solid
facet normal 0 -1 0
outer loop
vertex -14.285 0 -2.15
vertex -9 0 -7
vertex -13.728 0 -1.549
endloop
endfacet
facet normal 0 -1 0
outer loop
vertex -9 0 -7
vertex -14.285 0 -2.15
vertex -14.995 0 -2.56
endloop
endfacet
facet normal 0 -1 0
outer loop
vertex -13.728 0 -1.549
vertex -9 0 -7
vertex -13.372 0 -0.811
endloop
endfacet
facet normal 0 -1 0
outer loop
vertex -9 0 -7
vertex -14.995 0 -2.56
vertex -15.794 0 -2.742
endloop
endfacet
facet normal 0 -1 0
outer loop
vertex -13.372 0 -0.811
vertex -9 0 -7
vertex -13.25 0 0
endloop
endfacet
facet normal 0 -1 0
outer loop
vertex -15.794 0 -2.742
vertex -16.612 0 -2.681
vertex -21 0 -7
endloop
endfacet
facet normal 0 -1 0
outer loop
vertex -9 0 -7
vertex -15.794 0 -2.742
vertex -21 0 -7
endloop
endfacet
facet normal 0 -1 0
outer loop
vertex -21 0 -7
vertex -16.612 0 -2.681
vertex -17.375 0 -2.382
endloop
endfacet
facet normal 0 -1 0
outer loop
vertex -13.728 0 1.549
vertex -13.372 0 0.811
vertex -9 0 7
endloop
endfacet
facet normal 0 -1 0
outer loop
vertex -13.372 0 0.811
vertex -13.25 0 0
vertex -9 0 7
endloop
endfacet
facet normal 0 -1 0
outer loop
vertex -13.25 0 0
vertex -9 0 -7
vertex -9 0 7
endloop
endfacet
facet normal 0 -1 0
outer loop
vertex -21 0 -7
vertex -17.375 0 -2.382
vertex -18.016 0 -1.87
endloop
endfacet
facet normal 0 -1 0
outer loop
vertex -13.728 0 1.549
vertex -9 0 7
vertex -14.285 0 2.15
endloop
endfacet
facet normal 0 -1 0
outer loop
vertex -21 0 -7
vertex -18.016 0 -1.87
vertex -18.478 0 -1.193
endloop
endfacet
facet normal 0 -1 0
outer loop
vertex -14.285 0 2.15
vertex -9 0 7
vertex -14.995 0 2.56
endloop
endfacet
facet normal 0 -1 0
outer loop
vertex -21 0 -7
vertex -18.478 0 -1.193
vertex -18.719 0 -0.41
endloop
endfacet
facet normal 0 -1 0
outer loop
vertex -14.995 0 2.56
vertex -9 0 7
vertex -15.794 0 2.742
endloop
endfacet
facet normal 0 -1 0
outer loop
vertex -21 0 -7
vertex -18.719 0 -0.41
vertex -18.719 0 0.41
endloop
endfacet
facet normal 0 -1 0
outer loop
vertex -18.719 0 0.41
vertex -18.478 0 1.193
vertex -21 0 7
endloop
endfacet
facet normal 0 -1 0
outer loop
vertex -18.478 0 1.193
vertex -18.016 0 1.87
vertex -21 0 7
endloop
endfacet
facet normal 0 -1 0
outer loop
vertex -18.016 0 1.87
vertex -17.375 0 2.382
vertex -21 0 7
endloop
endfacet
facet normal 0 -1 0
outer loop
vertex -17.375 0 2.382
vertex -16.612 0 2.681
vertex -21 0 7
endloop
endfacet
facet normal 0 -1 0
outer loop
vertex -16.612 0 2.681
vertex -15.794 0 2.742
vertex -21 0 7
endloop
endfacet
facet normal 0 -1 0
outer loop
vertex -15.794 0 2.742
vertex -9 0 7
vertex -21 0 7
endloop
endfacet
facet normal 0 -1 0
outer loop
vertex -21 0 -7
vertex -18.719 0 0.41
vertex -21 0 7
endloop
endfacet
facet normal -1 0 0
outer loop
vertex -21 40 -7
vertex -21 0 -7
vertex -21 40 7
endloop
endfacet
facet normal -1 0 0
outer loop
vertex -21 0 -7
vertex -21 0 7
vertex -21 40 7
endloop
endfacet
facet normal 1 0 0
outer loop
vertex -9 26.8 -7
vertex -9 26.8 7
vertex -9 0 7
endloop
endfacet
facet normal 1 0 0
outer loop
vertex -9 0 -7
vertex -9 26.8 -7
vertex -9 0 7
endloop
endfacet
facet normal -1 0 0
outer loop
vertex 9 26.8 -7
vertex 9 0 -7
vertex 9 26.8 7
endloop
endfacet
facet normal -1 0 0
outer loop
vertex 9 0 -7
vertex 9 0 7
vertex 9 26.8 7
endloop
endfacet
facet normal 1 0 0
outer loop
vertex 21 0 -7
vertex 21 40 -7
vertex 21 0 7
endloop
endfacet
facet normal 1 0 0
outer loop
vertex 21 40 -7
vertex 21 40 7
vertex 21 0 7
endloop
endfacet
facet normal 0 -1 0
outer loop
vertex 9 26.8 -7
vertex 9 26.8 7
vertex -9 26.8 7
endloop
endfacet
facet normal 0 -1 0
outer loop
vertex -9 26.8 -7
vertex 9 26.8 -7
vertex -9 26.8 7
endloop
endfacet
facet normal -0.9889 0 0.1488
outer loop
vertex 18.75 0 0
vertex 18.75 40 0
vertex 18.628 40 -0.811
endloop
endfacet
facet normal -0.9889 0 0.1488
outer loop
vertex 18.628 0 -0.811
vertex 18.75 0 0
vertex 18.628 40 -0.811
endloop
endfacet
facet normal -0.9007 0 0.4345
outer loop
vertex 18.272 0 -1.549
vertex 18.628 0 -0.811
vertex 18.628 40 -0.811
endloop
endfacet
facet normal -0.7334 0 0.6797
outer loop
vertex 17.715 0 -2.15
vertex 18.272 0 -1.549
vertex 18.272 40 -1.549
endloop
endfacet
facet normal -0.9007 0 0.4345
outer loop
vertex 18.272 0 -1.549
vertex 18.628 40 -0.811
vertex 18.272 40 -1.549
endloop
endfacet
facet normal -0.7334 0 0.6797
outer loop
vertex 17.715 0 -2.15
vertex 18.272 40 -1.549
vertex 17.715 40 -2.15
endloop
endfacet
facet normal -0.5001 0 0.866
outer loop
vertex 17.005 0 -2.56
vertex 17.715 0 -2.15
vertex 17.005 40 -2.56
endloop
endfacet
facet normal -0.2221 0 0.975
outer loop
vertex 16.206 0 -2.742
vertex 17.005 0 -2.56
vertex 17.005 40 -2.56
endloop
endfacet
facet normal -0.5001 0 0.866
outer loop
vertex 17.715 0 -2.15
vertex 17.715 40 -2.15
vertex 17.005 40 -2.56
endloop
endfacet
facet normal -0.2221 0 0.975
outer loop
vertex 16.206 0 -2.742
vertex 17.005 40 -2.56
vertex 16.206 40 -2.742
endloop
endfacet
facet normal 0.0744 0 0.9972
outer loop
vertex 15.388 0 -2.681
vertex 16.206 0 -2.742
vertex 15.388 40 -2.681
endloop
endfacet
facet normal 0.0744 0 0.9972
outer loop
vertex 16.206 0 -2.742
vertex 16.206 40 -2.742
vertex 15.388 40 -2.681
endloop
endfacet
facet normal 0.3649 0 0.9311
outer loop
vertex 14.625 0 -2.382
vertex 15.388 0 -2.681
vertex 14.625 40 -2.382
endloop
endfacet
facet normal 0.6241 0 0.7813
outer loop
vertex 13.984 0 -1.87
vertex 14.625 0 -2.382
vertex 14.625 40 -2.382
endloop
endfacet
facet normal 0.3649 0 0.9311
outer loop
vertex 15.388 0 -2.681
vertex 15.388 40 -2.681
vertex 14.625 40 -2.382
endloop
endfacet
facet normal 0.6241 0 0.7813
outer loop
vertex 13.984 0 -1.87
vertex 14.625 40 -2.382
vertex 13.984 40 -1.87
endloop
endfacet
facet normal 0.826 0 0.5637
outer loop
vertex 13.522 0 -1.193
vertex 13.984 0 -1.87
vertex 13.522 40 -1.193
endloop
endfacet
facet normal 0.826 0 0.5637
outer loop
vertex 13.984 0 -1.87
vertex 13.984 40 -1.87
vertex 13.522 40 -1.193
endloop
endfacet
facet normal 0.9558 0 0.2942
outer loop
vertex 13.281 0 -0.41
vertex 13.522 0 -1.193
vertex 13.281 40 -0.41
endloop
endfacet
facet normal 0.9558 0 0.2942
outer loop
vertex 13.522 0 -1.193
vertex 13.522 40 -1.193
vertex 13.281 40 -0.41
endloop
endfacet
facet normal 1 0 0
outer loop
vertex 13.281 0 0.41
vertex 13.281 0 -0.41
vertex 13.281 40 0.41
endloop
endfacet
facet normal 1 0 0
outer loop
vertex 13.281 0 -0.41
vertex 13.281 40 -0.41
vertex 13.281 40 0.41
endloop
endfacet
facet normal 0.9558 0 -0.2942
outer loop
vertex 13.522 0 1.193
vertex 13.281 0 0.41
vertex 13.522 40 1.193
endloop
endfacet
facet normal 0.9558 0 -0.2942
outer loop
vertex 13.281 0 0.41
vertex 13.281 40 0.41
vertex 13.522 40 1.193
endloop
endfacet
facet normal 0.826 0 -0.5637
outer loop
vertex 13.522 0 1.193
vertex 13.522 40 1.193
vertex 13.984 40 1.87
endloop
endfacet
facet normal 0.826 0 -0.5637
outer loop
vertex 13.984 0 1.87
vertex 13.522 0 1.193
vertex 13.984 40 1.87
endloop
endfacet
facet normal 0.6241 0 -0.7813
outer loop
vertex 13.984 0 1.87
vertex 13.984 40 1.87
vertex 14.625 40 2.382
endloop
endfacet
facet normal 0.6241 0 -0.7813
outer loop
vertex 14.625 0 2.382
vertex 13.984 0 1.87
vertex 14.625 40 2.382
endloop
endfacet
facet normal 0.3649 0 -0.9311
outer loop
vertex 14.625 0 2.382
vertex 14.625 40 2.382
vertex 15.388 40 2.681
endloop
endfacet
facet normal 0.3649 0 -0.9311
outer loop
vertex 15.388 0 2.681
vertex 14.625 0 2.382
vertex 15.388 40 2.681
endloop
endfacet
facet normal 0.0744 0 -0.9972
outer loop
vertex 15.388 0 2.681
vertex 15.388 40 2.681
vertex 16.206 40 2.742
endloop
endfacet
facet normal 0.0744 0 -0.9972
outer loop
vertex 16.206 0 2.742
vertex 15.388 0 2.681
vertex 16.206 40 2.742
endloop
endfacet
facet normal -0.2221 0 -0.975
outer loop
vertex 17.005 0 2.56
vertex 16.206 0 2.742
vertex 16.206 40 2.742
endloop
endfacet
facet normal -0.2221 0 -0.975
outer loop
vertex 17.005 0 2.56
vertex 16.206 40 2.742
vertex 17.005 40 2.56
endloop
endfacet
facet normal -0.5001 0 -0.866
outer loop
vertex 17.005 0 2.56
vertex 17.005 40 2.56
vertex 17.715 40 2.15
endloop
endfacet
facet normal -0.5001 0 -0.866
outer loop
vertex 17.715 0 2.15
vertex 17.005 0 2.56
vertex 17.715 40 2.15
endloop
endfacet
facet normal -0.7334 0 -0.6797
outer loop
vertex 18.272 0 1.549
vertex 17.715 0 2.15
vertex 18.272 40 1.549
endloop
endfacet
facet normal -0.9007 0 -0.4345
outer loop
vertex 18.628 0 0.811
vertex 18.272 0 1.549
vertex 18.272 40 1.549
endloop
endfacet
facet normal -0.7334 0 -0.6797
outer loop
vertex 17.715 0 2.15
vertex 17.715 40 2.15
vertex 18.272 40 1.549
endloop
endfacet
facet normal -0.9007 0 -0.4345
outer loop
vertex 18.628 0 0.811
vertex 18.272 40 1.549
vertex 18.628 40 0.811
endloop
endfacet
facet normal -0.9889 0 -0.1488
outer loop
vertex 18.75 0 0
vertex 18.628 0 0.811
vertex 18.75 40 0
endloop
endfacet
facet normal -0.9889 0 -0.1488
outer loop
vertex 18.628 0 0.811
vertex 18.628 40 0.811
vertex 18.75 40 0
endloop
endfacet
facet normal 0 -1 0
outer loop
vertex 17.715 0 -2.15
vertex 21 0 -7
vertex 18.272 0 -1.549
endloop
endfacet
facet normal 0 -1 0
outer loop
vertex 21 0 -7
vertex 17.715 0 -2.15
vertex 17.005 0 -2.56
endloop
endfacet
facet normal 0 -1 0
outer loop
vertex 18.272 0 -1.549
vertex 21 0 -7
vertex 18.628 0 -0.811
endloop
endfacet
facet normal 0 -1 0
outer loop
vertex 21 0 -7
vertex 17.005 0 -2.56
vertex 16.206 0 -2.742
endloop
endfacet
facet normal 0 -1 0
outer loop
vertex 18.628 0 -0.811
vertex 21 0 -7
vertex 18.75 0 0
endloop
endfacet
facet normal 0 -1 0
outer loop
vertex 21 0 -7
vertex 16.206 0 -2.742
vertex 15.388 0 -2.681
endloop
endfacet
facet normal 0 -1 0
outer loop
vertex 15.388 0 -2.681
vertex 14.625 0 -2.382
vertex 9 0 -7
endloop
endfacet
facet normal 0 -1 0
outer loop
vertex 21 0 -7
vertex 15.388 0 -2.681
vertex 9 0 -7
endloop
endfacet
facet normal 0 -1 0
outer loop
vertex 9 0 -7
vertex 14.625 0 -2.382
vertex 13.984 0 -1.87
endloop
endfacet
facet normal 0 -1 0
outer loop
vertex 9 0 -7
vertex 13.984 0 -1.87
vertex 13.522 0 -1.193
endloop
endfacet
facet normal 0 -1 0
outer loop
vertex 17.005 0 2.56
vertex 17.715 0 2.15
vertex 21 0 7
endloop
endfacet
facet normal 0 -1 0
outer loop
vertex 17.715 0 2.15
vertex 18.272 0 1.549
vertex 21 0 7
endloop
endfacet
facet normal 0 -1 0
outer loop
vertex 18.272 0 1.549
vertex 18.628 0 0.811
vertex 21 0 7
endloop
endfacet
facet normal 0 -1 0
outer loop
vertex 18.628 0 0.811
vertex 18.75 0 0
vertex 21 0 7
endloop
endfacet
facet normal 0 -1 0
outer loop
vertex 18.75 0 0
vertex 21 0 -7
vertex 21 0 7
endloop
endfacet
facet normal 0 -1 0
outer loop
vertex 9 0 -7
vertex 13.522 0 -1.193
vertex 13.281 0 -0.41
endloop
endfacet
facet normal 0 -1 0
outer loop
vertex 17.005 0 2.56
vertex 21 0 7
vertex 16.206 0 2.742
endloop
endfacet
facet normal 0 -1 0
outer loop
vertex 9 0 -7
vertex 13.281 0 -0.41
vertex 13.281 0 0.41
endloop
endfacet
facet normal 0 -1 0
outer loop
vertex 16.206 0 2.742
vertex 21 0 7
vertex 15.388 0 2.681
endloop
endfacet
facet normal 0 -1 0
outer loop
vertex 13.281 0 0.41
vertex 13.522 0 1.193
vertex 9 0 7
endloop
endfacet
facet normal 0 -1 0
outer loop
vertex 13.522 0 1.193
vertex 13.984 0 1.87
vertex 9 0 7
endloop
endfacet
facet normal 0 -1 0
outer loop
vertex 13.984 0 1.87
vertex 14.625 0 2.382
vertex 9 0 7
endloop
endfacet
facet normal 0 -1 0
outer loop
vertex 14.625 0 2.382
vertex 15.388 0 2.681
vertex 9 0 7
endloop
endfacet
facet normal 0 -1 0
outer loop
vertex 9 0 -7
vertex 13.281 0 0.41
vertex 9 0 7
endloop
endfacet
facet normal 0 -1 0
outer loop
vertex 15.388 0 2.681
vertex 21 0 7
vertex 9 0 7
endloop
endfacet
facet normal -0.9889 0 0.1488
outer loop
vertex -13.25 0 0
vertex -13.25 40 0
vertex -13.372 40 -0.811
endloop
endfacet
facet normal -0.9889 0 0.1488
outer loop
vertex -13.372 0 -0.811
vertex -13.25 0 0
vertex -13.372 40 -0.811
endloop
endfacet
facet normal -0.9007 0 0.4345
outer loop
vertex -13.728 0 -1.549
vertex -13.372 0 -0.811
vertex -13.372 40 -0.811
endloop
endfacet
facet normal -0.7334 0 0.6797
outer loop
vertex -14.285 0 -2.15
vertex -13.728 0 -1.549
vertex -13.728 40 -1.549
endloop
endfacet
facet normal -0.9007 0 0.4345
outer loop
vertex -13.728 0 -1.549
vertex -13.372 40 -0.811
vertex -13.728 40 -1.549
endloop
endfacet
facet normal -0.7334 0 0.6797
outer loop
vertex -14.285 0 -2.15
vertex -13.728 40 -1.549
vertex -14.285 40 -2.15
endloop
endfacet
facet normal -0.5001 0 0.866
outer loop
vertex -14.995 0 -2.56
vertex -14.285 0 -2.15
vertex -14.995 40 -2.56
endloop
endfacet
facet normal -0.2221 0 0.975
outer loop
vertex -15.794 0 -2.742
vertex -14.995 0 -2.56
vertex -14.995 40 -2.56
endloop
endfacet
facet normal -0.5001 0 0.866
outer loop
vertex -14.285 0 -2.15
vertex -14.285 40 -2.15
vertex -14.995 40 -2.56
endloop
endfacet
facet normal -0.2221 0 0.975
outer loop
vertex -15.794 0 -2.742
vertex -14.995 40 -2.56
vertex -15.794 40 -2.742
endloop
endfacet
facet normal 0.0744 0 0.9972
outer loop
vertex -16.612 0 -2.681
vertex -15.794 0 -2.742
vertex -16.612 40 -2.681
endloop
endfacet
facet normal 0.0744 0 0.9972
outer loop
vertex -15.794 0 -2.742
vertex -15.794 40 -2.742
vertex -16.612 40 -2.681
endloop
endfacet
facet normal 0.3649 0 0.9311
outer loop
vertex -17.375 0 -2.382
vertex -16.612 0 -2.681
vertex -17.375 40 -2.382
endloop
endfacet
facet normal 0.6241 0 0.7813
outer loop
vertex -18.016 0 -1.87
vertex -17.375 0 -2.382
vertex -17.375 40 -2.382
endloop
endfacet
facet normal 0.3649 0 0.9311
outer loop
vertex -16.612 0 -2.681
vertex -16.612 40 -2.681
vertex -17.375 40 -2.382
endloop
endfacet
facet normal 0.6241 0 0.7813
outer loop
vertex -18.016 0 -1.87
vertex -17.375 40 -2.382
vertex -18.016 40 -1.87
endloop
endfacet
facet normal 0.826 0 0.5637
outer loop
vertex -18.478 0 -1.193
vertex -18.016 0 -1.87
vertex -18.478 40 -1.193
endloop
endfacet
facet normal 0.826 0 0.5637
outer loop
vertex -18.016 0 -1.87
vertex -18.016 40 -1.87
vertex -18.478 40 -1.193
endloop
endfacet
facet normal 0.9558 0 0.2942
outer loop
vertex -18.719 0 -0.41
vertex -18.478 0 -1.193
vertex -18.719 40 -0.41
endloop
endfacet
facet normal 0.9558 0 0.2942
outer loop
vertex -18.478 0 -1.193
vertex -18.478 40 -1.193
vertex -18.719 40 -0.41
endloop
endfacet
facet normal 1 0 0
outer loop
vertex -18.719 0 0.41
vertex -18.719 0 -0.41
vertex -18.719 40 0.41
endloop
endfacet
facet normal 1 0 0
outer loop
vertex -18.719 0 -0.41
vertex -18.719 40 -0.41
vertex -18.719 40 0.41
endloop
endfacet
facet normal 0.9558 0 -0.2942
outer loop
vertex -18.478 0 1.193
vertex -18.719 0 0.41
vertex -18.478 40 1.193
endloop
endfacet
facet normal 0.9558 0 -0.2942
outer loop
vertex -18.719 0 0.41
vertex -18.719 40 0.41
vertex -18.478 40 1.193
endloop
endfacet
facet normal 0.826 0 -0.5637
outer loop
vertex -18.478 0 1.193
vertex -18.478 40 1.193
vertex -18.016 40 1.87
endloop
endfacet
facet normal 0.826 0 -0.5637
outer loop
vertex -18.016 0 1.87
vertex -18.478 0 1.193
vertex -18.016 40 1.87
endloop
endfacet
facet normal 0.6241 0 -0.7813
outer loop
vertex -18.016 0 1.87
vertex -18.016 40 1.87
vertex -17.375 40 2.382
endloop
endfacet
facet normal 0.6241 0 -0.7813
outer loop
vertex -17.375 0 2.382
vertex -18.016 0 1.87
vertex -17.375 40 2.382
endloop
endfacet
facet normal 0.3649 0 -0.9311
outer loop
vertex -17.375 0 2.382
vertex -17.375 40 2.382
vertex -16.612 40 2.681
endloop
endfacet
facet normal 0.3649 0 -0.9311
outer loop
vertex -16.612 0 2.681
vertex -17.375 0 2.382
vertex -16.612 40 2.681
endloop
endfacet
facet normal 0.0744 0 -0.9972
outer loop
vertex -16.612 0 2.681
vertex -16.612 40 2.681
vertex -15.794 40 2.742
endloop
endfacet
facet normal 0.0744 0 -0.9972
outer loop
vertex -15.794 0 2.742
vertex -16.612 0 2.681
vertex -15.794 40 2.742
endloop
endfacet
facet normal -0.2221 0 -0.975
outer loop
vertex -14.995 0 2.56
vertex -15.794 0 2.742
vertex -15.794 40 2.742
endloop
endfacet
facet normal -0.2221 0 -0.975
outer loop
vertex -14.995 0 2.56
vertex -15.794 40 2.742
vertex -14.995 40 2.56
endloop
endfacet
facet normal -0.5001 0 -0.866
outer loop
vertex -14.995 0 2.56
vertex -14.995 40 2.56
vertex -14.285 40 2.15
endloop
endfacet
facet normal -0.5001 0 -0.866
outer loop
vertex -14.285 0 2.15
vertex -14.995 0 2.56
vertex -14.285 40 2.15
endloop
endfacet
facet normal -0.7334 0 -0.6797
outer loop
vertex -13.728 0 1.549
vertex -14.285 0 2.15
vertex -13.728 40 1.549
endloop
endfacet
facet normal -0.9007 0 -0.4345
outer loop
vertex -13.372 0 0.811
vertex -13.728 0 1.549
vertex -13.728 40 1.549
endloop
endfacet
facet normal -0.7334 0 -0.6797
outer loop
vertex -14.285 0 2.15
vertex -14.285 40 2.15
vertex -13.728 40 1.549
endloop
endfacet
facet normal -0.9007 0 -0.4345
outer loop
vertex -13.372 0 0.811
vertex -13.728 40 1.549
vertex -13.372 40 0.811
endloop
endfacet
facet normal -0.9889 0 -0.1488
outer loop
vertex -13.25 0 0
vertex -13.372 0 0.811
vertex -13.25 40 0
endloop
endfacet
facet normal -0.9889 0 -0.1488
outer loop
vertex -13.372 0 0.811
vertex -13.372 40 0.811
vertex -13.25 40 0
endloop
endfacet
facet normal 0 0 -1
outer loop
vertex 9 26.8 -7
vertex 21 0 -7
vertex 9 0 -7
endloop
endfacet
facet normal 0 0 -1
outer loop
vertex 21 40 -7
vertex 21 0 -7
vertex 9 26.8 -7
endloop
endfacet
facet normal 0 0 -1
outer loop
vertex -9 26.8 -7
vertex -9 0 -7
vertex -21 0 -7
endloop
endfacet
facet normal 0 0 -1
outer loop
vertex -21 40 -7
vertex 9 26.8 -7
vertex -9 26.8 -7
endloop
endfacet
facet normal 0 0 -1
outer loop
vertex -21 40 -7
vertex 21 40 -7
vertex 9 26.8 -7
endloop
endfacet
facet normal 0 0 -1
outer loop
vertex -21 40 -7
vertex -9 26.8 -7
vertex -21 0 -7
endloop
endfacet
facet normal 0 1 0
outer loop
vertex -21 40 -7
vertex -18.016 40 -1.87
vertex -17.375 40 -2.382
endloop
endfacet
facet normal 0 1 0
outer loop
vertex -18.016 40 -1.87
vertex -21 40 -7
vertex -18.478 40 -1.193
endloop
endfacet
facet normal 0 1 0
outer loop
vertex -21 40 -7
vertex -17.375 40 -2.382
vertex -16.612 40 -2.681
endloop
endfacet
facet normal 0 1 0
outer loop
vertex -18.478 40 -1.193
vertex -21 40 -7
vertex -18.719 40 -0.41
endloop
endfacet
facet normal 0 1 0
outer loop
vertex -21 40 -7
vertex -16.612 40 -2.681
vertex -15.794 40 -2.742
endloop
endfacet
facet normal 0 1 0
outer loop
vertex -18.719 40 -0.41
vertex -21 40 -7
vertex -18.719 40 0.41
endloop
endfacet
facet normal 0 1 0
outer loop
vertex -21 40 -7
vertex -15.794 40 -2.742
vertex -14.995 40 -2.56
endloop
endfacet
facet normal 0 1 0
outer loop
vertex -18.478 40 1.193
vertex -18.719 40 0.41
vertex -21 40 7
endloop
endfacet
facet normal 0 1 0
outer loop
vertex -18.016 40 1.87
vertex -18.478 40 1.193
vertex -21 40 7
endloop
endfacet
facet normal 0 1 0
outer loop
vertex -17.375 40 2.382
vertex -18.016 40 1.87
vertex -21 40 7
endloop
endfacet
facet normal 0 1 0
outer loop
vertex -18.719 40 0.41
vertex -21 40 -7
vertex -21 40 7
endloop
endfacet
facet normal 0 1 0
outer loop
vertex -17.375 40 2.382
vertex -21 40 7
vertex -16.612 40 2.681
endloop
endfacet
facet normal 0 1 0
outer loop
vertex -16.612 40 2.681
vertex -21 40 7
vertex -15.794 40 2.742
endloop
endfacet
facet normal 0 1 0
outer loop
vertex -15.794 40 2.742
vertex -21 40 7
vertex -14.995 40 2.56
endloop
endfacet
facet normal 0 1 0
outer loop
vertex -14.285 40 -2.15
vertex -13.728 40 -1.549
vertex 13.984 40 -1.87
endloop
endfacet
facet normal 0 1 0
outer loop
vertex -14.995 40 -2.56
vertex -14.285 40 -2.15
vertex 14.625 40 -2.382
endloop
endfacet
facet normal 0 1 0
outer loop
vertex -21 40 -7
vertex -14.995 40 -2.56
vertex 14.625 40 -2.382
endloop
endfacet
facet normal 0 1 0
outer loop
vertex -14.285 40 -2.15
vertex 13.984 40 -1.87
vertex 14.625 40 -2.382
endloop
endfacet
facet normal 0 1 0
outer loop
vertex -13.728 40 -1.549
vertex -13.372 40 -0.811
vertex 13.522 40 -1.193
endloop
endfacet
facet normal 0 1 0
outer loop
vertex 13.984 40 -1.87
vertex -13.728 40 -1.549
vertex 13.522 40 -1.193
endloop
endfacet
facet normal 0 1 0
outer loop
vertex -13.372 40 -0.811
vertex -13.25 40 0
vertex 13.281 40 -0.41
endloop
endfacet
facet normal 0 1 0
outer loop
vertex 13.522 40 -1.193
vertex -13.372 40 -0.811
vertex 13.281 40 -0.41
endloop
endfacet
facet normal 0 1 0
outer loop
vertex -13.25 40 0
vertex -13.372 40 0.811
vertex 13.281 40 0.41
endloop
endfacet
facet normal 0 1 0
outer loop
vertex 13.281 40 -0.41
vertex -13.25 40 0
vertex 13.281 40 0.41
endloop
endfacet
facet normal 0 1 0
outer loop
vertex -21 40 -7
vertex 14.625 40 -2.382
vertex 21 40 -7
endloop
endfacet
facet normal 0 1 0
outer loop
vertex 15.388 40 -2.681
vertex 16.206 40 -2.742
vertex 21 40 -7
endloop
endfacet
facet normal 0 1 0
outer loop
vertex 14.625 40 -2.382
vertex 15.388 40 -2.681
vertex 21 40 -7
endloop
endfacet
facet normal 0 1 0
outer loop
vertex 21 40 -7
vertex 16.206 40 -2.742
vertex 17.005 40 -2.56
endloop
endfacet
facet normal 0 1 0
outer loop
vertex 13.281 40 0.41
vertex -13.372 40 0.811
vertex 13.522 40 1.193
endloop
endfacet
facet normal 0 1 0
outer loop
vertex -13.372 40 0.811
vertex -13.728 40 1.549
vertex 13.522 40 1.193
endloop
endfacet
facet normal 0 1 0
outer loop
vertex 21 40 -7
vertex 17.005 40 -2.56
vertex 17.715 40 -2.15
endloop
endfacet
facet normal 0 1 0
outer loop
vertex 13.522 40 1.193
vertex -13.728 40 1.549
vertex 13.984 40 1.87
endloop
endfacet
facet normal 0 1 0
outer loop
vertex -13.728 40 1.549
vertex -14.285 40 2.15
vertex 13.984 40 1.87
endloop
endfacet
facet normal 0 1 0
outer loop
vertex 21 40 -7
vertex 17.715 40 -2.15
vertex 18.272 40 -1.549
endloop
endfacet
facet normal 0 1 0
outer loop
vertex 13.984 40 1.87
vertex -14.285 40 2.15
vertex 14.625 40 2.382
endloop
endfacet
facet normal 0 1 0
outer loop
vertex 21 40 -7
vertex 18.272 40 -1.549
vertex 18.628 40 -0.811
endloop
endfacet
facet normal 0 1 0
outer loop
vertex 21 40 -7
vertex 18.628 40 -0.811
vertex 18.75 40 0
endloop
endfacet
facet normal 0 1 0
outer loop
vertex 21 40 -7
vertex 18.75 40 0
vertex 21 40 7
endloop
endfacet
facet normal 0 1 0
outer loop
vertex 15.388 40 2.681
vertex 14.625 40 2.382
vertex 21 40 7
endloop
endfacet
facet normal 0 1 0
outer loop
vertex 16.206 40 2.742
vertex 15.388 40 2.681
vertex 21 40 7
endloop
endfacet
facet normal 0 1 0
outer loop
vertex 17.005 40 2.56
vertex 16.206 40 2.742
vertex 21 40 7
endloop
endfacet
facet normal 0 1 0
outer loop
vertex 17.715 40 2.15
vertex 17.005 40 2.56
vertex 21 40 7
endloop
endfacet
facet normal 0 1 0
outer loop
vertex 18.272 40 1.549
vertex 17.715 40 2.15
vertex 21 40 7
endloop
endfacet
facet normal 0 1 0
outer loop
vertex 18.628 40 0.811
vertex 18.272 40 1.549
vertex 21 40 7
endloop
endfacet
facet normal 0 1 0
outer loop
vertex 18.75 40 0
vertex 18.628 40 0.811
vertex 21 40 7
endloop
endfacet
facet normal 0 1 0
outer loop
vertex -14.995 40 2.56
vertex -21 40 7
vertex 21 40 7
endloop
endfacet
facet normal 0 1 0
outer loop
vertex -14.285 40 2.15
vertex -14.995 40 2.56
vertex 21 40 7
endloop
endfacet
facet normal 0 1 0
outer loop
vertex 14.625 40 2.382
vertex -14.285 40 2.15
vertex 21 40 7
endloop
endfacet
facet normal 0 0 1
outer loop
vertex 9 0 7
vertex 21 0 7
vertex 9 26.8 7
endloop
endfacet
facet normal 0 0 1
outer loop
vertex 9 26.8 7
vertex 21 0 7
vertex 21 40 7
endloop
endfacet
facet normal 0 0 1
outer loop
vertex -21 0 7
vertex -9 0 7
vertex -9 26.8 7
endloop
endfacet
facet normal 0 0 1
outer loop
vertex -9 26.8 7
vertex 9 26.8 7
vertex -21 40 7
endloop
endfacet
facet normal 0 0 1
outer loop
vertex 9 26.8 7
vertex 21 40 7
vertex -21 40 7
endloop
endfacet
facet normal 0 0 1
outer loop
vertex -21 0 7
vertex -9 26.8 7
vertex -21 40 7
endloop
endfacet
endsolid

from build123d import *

# Parameters (mm, degrees)
BOSS_EXTRUDE1_DEPTH = 7
SKETCH4_R           = 2.75
CUT_EXTRUDE1_DEPTH  = 40


with BuildPart() as part:
    # Sketch3 → Boss-Extrude1 (new body, symmetric)
    with BuildSketch(Plane.XY):
        Polygon((-9, 0), (-21, 0), (-21, 40), (21, 40), (21, 0), (9, 0), (9, 26.8), (-9, 26.8), align=None)
    extrude(amount=BOSS_EXTRUDE1_DEPTH, both=True)

    # Sketch4 → Cut-Extrude1 (cut)
    with BuildSketch(Plane(origin=(0, 40, 0), x_dir=(1, 0, 0), z_dir=(0, 1, 0))):
        with Locations((-16, 0)):
            Circle(SKETCH4_R)
        with Locations((16, 0)):
            Circle(SKETCH4_R)
    extrude(amount=-CUT_EXTRUDE1_DEPTH, mode=Mode.SUBTRACT)


solid = part.part
